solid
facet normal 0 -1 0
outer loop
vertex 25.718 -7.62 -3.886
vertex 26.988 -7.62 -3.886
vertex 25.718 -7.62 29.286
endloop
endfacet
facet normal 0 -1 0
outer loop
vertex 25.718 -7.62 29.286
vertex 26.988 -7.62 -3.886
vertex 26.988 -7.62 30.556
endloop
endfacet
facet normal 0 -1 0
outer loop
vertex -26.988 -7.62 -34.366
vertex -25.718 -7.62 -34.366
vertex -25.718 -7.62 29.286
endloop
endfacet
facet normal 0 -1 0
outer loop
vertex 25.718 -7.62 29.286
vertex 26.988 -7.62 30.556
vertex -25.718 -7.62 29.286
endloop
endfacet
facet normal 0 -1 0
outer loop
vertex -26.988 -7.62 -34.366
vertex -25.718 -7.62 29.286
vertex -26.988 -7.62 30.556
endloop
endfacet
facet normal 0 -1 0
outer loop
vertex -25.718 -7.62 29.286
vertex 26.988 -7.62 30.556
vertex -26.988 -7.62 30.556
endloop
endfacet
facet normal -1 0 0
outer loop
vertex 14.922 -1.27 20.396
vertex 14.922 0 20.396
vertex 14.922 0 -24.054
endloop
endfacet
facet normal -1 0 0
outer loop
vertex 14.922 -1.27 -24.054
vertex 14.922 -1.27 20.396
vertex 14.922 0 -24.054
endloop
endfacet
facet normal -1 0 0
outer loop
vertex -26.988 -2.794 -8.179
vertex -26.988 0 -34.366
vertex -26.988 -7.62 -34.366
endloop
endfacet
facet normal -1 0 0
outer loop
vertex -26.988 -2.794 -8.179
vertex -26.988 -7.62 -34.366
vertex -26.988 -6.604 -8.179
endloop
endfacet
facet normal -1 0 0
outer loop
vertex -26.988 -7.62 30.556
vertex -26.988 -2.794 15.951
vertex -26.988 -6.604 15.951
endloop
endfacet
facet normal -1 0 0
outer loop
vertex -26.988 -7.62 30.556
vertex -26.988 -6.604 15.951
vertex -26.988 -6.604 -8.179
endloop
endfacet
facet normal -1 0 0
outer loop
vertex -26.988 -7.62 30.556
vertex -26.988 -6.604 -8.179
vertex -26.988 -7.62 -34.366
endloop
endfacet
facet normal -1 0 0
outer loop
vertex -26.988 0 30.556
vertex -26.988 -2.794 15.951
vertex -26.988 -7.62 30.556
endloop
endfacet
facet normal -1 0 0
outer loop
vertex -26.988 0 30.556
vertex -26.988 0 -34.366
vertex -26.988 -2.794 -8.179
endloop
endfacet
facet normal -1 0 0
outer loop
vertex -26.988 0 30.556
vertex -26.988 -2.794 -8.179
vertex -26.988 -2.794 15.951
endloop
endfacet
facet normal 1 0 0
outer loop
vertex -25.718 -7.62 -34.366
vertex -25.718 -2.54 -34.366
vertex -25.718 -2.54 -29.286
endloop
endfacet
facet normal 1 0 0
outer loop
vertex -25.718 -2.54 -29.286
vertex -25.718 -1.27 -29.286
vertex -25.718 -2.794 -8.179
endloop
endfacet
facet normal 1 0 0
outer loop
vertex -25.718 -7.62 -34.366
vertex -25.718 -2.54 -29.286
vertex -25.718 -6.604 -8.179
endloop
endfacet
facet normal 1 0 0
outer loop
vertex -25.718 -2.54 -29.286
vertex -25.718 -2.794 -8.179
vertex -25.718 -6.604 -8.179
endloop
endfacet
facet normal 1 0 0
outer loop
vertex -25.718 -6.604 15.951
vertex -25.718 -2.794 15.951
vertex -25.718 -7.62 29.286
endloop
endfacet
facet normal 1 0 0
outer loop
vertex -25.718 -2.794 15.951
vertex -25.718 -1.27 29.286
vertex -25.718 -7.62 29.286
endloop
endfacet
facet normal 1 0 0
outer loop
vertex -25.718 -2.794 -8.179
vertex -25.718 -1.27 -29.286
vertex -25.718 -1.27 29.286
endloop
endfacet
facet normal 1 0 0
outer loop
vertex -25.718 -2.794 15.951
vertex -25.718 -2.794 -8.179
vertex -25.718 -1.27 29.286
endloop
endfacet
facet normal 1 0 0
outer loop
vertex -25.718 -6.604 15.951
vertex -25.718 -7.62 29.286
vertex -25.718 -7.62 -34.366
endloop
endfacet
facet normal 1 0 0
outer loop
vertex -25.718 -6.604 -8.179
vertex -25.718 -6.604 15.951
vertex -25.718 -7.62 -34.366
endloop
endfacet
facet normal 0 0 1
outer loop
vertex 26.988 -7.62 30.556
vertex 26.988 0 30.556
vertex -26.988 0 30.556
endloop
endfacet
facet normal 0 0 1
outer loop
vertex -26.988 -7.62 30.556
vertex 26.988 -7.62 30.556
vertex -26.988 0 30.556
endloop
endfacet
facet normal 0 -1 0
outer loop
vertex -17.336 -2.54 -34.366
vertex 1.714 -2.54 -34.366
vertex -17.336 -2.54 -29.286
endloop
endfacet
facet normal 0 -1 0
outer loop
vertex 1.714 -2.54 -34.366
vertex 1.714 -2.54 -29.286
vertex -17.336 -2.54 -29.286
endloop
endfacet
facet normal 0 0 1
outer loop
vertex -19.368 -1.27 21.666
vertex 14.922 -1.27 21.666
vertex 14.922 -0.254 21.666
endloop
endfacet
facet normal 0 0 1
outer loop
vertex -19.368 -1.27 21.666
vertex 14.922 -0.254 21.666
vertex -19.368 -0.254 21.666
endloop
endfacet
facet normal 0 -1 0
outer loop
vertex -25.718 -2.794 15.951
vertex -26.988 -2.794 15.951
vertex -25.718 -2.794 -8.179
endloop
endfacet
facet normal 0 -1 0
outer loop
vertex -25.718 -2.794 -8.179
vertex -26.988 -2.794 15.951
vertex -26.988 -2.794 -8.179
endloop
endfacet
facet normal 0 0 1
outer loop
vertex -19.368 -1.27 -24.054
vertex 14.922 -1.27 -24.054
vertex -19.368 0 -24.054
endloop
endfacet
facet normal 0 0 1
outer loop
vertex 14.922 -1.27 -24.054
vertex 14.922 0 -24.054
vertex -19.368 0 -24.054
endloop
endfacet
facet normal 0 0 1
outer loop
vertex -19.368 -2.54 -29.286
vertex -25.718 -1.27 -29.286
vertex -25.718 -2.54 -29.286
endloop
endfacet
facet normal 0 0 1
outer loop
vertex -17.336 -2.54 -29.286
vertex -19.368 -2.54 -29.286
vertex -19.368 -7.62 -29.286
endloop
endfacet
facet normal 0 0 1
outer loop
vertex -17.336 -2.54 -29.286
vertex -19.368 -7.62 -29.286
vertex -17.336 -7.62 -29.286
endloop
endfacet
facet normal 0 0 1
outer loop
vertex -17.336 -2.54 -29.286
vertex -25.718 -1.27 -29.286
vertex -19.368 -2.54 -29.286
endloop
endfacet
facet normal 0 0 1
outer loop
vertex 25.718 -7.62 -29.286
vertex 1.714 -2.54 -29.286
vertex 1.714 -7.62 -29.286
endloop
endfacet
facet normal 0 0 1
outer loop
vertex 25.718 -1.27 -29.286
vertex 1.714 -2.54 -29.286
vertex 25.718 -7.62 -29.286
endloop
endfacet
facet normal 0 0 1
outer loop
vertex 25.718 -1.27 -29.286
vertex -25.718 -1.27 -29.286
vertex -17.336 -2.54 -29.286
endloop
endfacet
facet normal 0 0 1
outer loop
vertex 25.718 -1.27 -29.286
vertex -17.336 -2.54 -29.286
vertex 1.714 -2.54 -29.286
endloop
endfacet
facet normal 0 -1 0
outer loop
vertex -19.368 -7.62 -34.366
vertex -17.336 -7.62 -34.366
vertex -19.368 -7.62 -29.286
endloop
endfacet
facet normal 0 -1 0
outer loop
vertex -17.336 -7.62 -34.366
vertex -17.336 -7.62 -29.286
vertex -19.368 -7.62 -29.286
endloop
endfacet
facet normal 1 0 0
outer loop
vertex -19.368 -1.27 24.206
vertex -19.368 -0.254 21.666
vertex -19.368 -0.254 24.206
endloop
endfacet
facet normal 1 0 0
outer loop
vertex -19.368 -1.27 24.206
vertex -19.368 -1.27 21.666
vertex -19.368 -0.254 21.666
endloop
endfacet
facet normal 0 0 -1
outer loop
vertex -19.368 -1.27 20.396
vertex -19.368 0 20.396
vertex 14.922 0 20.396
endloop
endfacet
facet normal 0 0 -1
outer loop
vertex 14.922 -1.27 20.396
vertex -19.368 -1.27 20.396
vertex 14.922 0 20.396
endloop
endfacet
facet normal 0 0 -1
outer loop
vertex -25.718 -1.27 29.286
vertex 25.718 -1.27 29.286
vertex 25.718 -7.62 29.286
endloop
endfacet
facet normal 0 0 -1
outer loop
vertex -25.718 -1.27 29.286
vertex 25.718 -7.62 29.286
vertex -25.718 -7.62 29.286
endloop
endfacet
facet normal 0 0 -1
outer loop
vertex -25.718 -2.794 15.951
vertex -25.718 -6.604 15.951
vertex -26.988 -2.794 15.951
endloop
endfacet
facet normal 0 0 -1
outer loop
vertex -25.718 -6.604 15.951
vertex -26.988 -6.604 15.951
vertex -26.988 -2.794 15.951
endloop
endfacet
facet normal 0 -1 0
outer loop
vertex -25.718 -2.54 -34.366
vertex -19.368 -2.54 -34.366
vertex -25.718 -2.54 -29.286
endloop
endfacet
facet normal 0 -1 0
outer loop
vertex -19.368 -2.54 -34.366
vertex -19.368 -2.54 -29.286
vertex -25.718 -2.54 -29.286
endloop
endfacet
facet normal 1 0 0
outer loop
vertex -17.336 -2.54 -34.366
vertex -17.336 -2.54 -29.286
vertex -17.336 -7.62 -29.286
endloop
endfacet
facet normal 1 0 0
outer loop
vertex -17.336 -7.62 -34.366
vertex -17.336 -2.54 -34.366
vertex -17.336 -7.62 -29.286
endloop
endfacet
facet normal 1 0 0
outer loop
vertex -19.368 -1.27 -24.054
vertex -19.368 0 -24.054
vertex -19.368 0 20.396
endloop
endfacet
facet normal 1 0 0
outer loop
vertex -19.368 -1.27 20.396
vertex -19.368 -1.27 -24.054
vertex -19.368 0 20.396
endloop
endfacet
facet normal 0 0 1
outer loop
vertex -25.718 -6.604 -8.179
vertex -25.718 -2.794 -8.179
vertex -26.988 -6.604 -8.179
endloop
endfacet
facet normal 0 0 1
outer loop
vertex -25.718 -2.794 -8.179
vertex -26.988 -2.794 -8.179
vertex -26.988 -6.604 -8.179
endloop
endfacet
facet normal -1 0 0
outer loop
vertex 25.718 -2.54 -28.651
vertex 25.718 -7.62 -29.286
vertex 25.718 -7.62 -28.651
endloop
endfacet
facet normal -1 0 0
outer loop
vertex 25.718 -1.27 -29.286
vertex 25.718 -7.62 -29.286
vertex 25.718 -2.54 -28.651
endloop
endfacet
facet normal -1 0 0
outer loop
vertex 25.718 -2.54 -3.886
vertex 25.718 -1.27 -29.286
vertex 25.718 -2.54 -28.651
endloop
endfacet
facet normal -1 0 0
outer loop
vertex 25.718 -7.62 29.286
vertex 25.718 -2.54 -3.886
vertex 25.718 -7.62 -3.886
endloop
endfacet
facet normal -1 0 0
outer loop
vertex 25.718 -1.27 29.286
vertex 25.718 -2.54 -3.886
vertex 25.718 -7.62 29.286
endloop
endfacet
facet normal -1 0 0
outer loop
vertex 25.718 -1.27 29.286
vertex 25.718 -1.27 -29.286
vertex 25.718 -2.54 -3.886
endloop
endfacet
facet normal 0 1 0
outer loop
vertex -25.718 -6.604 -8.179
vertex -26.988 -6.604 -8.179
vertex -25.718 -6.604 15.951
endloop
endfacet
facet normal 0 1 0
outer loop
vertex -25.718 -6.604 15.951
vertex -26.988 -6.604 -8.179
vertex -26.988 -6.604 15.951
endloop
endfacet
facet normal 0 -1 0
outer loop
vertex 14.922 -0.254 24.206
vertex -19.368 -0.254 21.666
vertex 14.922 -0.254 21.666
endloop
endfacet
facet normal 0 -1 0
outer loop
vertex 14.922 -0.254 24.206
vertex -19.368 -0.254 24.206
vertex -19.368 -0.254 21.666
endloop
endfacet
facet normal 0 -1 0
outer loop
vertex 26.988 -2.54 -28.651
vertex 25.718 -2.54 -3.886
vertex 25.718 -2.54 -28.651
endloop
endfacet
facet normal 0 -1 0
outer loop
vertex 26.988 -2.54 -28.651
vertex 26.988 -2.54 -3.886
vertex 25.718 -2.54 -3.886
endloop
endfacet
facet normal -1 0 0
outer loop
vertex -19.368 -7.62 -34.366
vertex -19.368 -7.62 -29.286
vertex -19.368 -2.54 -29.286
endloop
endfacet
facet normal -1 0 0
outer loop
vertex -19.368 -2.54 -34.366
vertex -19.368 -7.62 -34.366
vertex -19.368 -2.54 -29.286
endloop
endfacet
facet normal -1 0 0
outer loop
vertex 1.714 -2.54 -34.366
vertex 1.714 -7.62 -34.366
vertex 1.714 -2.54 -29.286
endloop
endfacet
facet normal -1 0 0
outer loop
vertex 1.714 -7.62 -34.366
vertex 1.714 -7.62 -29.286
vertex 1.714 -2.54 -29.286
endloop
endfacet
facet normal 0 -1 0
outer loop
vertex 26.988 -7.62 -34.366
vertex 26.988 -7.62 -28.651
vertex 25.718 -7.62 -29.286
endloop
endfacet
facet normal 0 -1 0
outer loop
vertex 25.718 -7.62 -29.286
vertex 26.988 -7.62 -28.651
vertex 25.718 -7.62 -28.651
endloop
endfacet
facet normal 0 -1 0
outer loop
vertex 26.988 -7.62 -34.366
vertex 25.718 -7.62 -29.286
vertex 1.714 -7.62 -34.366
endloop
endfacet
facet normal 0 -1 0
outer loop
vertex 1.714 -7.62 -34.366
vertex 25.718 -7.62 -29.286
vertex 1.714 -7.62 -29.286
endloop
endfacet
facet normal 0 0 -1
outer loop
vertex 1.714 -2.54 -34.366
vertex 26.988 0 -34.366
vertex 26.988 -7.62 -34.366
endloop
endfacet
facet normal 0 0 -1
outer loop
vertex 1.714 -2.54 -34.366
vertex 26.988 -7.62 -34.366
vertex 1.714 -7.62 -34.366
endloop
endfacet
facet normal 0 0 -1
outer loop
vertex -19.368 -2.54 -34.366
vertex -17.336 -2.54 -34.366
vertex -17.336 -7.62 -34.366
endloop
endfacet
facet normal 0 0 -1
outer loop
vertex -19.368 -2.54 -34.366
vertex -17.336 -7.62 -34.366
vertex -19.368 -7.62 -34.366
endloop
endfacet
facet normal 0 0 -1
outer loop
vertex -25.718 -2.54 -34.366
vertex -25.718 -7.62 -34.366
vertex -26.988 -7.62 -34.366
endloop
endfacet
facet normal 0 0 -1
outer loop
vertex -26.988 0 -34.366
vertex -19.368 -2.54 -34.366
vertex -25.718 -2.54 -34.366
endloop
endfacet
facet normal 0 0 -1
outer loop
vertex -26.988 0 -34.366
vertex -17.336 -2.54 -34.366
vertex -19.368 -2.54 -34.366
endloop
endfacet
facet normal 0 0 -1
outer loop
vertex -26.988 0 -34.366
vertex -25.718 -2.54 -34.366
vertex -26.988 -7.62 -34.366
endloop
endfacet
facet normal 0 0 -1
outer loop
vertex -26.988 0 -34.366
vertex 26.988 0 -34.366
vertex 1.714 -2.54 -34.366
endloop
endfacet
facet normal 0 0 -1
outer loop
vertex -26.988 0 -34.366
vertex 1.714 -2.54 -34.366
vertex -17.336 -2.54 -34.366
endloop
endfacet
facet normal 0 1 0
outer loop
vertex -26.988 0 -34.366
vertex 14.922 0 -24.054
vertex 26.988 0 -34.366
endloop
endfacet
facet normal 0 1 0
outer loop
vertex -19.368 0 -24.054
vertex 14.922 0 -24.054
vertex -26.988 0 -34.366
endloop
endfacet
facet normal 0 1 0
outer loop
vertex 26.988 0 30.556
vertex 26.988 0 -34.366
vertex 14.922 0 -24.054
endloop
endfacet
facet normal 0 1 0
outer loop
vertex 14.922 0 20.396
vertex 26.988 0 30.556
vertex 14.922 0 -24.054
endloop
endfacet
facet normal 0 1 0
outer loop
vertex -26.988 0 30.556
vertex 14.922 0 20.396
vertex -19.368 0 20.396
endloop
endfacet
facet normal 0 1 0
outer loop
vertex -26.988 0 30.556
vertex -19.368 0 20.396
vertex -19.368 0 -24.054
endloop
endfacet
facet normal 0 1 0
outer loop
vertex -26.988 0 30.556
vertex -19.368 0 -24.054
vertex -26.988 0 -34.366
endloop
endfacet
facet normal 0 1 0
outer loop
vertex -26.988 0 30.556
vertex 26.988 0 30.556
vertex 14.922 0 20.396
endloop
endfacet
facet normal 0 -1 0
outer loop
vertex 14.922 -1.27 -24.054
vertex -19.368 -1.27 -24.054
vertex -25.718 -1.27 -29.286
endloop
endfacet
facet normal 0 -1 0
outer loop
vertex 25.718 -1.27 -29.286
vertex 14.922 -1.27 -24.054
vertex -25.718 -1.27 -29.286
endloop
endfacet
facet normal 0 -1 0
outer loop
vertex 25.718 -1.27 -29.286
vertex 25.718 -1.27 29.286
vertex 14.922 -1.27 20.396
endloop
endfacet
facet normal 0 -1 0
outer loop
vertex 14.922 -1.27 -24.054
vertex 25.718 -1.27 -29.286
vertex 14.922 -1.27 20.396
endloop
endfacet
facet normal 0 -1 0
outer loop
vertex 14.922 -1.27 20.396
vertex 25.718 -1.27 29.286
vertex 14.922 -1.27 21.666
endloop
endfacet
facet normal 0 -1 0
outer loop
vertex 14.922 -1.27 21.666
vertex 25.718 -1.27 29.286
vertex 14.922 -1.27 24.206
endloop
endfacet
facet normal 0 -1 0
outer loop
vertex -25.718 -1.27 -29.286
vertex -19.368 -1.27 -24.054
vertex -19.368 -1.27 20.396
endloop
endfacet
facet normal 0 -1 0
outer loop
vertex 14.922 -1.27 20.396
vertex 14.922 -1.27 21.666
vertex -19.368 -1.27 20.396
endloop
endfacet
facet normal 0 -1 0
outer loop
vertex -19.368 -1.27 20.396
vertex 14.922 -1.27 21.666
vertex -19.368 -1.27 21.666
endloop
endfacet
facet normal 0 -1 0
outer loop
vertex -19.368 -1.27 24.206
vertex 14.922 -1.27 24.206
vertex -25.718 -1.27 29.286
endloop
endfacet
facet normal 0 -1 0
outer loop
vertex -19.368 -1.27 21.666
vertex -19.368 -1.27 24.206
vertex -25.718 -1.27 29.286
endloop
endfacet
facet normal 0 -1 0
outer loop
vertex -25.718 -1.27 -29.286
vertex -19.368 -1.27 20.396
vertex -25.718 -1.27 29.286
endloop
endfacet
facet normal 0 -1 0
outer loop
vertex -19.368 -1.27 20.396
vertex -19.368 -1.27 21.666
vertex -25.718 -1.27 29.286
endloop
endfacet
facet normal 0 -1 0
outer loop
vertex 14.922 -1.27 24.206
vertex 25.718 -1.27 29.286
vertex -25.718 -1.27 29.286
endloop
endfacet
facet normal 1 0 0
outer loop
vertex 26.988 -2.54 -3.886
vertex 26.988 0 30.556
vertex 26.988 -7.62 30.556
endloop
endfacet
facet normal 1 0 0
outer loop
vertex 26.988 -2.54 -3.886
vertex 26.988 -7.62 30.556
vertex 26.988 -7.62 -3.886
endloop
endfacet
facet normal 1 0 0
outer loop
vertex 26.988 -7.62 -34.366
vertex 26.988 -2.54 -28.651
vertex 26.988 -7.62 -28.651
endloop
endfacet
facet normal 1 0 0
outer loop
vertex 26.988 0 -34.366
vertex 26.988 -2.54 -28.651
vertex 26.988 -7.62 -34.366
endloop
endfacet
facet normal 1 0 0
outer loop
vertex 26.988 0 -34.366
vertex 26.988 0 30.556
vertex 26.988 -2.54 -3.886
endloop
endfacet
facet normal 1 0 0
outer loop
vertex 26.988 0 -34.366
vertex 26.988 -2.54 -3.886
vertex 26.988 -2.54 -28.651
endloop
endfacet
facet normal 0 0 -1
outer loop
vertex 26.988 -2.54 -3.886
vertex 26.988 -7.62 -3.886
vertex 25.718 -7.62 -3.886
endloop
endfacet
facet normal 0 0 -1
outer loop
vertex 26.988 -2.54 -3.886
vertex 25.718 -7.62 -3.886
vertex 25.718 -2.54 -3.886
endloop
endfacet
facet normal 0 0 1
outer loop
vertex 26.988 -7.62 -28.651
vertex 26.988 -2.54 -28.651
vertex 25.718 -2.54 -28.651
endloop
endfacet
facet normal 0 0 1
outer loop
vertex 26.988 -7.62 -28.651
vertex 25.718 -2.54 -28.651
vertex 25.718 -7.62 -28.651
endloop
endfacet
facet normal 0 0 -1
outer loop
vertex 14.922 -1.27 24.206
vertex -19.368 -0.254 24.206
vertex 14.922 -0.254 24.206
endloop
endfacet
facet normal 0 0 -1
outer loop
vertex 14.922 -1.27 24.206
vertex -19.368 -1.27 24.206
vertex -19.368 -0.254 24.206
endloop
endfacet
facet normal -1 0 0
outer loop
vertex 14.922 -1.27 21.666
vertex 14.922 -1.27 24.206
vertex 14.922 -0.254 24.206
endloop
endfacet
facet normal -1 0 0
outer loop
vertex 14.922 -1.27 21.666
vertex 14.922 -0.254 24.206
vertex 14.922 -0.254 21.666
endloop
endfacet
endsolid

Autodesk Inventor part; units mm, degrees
ref_plane "YZ Plane" through (0, 0, 0) normal (1, 0, 0) x (0, 1, 0)
ref_plane "XZ Plane" through (0, 0, 0) normal (0, 1, 0) x (-1, 0, 0)
ref_plane "XY Plane" through (0, 0, 0) normal (0, 0, 1) x (1, 0, 0)
sketch "Top Plate" plane through (0, 0, 0) normal (0, 1, 0) x (-1, 0, 0)
  line L0 (-26.9875, 30.5562) -> (26.9875, 30.5562)
  line L1 (26.9875, 30.5562) -> (26.9875, -30.5562)
  line L2 (26.9875, -30.5562) -> (-26.9875, -30.5562)
  line L3 (-26.9875, -30.5562) -> (-26.9875, 30.5562)
  line L4 (-26.9875, 30.5562) -> (26.9875, -30.5562) construction
  line L5 (26.9875, 30.5562) -> (-26.9875, -30.5562) construction
  line L6 (19.3675, 20.3962) -> (-14.9225, 20.3962)
  line L7 (-14.9225, 20.3962) -> (-14.9225, -24.0538)
  line L8 (-14.9225, -24.0538) -> (19.3675, -24.0538)
  line L9 (19.3675, -24.0538) -> (19.3675, 20.3962)
  line L10 (18.9103, 30.5562) -> (18.2753, 30.5562)
  line L11 (12.3825, 28.0162) -> (13.0175, 28.0162)
  line L12 (13.0175, 28.0162) -> (13.0175, 30.5562)
  line L13 (13.0175, 30.5562) -> (12.3825, 30.5562)
  line L14 (12.3825, 30.5562) -> (12.3825, 28.0162)
  line L15 (26.9875, -30.5562) -> (-26.9875, -30.5562)
  line L16 (-26.9875, -30.5562) -> (-26.9875, -34.3662)
  line L17 (-26.9875, -34.3662) -> (26.9875, -34.3662)
  line L18 (26.9875, -34.3662) -> (26.9875, -30.5562)
  point P0 (0, 0)
  dimension "d0" = 53.975
  dimension "d1" = 61.1124
  dimension "d7" = 44.45
  dimension "d8" = 34.29
  dimension "d9" = 7.62
  dimension "d10" = 10.16
  dimension "d48" = 0.635
  dimension "d49" = 6.35
  dimension "d50" = 2.54
  dimension "d77" = 3.81
extrude "Top Plate Ext" add sketch "Top Plate" against normal blind 7.62 contours L0 L14 L11 L12 L1 L2 L3 | L0 L12 L11 L14 | L9 L8 L7 L6
shell "Top Plate Shell" thickness 1.27 removed faces 1 at (8.9958, -7.62, 10.1854)
extrude "Display Cutout" cut sketch "Top Plate" against normal blind 1.27 contours L9 L8 L7 L6
sketch "Power Btn" plane through (26.9875, 0, 30.5562) normal (1, 0, 0) x (0, 0, -1)
  line L0 (59.8424, -7.62) -> (1.27, -7.62) projected
  line L1 (59.2074, -7.62) -> (34.4424, -7.62)
  line L2 (34.4424, -7.62) -> (34.4424, -2.54)
  line L3 (34.4424, -2.54) -> (59.2074, -2.54)
  line L4 (59.2074, -2.54) -> (59.2074, -7.62)
  line L5 (61.1124, 0) -> (61.1124, -7.62) projected
  line L6 (61.1124, 0) -> (0, 0) projected
  point P0 (30.5562, 0)
  dimension "d18" = 1.905
  dimension "d19" = 24.765
  dimension "d20" = 2.54
sketch "Dial/Vol" plane through (26.9875, 0, -30.5562) normal (0, 0, -1) x (-1, 0, 0)
  line L0 (53.975, -7.62) -> (0, -7.62) projected
  line L1 (52.705, -7.62) -> (46.355, -7.62)
  line L2 (46.355, -7.62) -> (46.355, -2.54)
  line L3 (46.355, -2.54) -> (52.705, -2.54)
  line L4 (52.705, -2.54) -> (52.705, -7.62)
  line L5 (53.975, 0) -> (0, 0) projected
  line L6 (52.705, -1.27) -> (52.705, -7.62) projected
  line L7 (1.27, -7.62) -> (52.705, -7.62) projected
  line L8 (44.323, -7.62) -> (25.273, -7.62)
  line L9 (25.273, -7.62) -> (25.273, -2.54)
  line L10 (25.273, -2.54) -> (44.323, -2.54)
  line L11 (44.323, -2.54) -> (44.323, -7.62)
  point P0 (26.9875, 0)
  dimension "d23" = 2.54
  dimension "d24" = 6.35
  dimension "d25" = 2.032
  dimension "d26" = 19.05
extrude "Power Cutout" cut sketch "Power Btn" against normal blind 1.27
extrude "Dial/Vol Cutout1" cut sketch "Dial/Vol" along normal blind 3.81 and the other way blind 1.27
sketch "SD Port" plane through (-26.9875, 0, -30.5562) normal (-1, 0, 0) x (0, 0, 1)
  line L0 (22.3774, -6.604) -> (46.5074, -6.604)
  line L1 (46.5074, -6.604) -> (46.5074, -2.794)
  line L2 (46.5074, -2.794) -> (22.3774, -2.794)
  line L3 (22.3774, -2.794) -> (22.3774, -6.604)
  line L4 (61.1124, 0) -> (0, 0) projected
  point P0 (30.5562, 0)
  point P1 (50.9524, 0)
  dimension "d31" = 2.794
  dimension "d32" = 3.81
  dimension "d33" = 24.13
  dimension "d34" = 4.445
extrude "SD Port Cutout" cut sketch "SD Port" against normal blind 1.27
sketch "Display Pins" plane through (-25.7175, -1.27, -29.2862) normal (0, -1, 0) x (1, 0, 0)
  line L0 (40.64, 50.9524) -> (6.35, 50.9524)
  line L1 (6.35, 50.9524) -> (6.35, 53.4924)
  line L2 (6.35, 53.4924) -> (40.64, 53.4924)
  line L3 (40.64, 53.4924) -> (40.64, 50.9524)
  line L4 (40.64, 49.6824) -> (40.64, 5.2324) projected
  line L5 (6.35, 5.2324) -> (6.35, 49.6824) projected
  point P0 (25.7175, 29.2862)
  dimension "d56" = 1.27
  dimension "d57" = 2.54
extrude "Display Pins Cutout" cut sketch "Display Pins" against normal blind 1.016
extrude "M3 Screw Ext" add sketch "Top Plate" against normal blind 7.62 contours L2 L18 L17 L16
extrude "Dial/Vol Cutout2" cut sketch "Dial/Vol" along normal blind 7.62
properties part number "lisa"
